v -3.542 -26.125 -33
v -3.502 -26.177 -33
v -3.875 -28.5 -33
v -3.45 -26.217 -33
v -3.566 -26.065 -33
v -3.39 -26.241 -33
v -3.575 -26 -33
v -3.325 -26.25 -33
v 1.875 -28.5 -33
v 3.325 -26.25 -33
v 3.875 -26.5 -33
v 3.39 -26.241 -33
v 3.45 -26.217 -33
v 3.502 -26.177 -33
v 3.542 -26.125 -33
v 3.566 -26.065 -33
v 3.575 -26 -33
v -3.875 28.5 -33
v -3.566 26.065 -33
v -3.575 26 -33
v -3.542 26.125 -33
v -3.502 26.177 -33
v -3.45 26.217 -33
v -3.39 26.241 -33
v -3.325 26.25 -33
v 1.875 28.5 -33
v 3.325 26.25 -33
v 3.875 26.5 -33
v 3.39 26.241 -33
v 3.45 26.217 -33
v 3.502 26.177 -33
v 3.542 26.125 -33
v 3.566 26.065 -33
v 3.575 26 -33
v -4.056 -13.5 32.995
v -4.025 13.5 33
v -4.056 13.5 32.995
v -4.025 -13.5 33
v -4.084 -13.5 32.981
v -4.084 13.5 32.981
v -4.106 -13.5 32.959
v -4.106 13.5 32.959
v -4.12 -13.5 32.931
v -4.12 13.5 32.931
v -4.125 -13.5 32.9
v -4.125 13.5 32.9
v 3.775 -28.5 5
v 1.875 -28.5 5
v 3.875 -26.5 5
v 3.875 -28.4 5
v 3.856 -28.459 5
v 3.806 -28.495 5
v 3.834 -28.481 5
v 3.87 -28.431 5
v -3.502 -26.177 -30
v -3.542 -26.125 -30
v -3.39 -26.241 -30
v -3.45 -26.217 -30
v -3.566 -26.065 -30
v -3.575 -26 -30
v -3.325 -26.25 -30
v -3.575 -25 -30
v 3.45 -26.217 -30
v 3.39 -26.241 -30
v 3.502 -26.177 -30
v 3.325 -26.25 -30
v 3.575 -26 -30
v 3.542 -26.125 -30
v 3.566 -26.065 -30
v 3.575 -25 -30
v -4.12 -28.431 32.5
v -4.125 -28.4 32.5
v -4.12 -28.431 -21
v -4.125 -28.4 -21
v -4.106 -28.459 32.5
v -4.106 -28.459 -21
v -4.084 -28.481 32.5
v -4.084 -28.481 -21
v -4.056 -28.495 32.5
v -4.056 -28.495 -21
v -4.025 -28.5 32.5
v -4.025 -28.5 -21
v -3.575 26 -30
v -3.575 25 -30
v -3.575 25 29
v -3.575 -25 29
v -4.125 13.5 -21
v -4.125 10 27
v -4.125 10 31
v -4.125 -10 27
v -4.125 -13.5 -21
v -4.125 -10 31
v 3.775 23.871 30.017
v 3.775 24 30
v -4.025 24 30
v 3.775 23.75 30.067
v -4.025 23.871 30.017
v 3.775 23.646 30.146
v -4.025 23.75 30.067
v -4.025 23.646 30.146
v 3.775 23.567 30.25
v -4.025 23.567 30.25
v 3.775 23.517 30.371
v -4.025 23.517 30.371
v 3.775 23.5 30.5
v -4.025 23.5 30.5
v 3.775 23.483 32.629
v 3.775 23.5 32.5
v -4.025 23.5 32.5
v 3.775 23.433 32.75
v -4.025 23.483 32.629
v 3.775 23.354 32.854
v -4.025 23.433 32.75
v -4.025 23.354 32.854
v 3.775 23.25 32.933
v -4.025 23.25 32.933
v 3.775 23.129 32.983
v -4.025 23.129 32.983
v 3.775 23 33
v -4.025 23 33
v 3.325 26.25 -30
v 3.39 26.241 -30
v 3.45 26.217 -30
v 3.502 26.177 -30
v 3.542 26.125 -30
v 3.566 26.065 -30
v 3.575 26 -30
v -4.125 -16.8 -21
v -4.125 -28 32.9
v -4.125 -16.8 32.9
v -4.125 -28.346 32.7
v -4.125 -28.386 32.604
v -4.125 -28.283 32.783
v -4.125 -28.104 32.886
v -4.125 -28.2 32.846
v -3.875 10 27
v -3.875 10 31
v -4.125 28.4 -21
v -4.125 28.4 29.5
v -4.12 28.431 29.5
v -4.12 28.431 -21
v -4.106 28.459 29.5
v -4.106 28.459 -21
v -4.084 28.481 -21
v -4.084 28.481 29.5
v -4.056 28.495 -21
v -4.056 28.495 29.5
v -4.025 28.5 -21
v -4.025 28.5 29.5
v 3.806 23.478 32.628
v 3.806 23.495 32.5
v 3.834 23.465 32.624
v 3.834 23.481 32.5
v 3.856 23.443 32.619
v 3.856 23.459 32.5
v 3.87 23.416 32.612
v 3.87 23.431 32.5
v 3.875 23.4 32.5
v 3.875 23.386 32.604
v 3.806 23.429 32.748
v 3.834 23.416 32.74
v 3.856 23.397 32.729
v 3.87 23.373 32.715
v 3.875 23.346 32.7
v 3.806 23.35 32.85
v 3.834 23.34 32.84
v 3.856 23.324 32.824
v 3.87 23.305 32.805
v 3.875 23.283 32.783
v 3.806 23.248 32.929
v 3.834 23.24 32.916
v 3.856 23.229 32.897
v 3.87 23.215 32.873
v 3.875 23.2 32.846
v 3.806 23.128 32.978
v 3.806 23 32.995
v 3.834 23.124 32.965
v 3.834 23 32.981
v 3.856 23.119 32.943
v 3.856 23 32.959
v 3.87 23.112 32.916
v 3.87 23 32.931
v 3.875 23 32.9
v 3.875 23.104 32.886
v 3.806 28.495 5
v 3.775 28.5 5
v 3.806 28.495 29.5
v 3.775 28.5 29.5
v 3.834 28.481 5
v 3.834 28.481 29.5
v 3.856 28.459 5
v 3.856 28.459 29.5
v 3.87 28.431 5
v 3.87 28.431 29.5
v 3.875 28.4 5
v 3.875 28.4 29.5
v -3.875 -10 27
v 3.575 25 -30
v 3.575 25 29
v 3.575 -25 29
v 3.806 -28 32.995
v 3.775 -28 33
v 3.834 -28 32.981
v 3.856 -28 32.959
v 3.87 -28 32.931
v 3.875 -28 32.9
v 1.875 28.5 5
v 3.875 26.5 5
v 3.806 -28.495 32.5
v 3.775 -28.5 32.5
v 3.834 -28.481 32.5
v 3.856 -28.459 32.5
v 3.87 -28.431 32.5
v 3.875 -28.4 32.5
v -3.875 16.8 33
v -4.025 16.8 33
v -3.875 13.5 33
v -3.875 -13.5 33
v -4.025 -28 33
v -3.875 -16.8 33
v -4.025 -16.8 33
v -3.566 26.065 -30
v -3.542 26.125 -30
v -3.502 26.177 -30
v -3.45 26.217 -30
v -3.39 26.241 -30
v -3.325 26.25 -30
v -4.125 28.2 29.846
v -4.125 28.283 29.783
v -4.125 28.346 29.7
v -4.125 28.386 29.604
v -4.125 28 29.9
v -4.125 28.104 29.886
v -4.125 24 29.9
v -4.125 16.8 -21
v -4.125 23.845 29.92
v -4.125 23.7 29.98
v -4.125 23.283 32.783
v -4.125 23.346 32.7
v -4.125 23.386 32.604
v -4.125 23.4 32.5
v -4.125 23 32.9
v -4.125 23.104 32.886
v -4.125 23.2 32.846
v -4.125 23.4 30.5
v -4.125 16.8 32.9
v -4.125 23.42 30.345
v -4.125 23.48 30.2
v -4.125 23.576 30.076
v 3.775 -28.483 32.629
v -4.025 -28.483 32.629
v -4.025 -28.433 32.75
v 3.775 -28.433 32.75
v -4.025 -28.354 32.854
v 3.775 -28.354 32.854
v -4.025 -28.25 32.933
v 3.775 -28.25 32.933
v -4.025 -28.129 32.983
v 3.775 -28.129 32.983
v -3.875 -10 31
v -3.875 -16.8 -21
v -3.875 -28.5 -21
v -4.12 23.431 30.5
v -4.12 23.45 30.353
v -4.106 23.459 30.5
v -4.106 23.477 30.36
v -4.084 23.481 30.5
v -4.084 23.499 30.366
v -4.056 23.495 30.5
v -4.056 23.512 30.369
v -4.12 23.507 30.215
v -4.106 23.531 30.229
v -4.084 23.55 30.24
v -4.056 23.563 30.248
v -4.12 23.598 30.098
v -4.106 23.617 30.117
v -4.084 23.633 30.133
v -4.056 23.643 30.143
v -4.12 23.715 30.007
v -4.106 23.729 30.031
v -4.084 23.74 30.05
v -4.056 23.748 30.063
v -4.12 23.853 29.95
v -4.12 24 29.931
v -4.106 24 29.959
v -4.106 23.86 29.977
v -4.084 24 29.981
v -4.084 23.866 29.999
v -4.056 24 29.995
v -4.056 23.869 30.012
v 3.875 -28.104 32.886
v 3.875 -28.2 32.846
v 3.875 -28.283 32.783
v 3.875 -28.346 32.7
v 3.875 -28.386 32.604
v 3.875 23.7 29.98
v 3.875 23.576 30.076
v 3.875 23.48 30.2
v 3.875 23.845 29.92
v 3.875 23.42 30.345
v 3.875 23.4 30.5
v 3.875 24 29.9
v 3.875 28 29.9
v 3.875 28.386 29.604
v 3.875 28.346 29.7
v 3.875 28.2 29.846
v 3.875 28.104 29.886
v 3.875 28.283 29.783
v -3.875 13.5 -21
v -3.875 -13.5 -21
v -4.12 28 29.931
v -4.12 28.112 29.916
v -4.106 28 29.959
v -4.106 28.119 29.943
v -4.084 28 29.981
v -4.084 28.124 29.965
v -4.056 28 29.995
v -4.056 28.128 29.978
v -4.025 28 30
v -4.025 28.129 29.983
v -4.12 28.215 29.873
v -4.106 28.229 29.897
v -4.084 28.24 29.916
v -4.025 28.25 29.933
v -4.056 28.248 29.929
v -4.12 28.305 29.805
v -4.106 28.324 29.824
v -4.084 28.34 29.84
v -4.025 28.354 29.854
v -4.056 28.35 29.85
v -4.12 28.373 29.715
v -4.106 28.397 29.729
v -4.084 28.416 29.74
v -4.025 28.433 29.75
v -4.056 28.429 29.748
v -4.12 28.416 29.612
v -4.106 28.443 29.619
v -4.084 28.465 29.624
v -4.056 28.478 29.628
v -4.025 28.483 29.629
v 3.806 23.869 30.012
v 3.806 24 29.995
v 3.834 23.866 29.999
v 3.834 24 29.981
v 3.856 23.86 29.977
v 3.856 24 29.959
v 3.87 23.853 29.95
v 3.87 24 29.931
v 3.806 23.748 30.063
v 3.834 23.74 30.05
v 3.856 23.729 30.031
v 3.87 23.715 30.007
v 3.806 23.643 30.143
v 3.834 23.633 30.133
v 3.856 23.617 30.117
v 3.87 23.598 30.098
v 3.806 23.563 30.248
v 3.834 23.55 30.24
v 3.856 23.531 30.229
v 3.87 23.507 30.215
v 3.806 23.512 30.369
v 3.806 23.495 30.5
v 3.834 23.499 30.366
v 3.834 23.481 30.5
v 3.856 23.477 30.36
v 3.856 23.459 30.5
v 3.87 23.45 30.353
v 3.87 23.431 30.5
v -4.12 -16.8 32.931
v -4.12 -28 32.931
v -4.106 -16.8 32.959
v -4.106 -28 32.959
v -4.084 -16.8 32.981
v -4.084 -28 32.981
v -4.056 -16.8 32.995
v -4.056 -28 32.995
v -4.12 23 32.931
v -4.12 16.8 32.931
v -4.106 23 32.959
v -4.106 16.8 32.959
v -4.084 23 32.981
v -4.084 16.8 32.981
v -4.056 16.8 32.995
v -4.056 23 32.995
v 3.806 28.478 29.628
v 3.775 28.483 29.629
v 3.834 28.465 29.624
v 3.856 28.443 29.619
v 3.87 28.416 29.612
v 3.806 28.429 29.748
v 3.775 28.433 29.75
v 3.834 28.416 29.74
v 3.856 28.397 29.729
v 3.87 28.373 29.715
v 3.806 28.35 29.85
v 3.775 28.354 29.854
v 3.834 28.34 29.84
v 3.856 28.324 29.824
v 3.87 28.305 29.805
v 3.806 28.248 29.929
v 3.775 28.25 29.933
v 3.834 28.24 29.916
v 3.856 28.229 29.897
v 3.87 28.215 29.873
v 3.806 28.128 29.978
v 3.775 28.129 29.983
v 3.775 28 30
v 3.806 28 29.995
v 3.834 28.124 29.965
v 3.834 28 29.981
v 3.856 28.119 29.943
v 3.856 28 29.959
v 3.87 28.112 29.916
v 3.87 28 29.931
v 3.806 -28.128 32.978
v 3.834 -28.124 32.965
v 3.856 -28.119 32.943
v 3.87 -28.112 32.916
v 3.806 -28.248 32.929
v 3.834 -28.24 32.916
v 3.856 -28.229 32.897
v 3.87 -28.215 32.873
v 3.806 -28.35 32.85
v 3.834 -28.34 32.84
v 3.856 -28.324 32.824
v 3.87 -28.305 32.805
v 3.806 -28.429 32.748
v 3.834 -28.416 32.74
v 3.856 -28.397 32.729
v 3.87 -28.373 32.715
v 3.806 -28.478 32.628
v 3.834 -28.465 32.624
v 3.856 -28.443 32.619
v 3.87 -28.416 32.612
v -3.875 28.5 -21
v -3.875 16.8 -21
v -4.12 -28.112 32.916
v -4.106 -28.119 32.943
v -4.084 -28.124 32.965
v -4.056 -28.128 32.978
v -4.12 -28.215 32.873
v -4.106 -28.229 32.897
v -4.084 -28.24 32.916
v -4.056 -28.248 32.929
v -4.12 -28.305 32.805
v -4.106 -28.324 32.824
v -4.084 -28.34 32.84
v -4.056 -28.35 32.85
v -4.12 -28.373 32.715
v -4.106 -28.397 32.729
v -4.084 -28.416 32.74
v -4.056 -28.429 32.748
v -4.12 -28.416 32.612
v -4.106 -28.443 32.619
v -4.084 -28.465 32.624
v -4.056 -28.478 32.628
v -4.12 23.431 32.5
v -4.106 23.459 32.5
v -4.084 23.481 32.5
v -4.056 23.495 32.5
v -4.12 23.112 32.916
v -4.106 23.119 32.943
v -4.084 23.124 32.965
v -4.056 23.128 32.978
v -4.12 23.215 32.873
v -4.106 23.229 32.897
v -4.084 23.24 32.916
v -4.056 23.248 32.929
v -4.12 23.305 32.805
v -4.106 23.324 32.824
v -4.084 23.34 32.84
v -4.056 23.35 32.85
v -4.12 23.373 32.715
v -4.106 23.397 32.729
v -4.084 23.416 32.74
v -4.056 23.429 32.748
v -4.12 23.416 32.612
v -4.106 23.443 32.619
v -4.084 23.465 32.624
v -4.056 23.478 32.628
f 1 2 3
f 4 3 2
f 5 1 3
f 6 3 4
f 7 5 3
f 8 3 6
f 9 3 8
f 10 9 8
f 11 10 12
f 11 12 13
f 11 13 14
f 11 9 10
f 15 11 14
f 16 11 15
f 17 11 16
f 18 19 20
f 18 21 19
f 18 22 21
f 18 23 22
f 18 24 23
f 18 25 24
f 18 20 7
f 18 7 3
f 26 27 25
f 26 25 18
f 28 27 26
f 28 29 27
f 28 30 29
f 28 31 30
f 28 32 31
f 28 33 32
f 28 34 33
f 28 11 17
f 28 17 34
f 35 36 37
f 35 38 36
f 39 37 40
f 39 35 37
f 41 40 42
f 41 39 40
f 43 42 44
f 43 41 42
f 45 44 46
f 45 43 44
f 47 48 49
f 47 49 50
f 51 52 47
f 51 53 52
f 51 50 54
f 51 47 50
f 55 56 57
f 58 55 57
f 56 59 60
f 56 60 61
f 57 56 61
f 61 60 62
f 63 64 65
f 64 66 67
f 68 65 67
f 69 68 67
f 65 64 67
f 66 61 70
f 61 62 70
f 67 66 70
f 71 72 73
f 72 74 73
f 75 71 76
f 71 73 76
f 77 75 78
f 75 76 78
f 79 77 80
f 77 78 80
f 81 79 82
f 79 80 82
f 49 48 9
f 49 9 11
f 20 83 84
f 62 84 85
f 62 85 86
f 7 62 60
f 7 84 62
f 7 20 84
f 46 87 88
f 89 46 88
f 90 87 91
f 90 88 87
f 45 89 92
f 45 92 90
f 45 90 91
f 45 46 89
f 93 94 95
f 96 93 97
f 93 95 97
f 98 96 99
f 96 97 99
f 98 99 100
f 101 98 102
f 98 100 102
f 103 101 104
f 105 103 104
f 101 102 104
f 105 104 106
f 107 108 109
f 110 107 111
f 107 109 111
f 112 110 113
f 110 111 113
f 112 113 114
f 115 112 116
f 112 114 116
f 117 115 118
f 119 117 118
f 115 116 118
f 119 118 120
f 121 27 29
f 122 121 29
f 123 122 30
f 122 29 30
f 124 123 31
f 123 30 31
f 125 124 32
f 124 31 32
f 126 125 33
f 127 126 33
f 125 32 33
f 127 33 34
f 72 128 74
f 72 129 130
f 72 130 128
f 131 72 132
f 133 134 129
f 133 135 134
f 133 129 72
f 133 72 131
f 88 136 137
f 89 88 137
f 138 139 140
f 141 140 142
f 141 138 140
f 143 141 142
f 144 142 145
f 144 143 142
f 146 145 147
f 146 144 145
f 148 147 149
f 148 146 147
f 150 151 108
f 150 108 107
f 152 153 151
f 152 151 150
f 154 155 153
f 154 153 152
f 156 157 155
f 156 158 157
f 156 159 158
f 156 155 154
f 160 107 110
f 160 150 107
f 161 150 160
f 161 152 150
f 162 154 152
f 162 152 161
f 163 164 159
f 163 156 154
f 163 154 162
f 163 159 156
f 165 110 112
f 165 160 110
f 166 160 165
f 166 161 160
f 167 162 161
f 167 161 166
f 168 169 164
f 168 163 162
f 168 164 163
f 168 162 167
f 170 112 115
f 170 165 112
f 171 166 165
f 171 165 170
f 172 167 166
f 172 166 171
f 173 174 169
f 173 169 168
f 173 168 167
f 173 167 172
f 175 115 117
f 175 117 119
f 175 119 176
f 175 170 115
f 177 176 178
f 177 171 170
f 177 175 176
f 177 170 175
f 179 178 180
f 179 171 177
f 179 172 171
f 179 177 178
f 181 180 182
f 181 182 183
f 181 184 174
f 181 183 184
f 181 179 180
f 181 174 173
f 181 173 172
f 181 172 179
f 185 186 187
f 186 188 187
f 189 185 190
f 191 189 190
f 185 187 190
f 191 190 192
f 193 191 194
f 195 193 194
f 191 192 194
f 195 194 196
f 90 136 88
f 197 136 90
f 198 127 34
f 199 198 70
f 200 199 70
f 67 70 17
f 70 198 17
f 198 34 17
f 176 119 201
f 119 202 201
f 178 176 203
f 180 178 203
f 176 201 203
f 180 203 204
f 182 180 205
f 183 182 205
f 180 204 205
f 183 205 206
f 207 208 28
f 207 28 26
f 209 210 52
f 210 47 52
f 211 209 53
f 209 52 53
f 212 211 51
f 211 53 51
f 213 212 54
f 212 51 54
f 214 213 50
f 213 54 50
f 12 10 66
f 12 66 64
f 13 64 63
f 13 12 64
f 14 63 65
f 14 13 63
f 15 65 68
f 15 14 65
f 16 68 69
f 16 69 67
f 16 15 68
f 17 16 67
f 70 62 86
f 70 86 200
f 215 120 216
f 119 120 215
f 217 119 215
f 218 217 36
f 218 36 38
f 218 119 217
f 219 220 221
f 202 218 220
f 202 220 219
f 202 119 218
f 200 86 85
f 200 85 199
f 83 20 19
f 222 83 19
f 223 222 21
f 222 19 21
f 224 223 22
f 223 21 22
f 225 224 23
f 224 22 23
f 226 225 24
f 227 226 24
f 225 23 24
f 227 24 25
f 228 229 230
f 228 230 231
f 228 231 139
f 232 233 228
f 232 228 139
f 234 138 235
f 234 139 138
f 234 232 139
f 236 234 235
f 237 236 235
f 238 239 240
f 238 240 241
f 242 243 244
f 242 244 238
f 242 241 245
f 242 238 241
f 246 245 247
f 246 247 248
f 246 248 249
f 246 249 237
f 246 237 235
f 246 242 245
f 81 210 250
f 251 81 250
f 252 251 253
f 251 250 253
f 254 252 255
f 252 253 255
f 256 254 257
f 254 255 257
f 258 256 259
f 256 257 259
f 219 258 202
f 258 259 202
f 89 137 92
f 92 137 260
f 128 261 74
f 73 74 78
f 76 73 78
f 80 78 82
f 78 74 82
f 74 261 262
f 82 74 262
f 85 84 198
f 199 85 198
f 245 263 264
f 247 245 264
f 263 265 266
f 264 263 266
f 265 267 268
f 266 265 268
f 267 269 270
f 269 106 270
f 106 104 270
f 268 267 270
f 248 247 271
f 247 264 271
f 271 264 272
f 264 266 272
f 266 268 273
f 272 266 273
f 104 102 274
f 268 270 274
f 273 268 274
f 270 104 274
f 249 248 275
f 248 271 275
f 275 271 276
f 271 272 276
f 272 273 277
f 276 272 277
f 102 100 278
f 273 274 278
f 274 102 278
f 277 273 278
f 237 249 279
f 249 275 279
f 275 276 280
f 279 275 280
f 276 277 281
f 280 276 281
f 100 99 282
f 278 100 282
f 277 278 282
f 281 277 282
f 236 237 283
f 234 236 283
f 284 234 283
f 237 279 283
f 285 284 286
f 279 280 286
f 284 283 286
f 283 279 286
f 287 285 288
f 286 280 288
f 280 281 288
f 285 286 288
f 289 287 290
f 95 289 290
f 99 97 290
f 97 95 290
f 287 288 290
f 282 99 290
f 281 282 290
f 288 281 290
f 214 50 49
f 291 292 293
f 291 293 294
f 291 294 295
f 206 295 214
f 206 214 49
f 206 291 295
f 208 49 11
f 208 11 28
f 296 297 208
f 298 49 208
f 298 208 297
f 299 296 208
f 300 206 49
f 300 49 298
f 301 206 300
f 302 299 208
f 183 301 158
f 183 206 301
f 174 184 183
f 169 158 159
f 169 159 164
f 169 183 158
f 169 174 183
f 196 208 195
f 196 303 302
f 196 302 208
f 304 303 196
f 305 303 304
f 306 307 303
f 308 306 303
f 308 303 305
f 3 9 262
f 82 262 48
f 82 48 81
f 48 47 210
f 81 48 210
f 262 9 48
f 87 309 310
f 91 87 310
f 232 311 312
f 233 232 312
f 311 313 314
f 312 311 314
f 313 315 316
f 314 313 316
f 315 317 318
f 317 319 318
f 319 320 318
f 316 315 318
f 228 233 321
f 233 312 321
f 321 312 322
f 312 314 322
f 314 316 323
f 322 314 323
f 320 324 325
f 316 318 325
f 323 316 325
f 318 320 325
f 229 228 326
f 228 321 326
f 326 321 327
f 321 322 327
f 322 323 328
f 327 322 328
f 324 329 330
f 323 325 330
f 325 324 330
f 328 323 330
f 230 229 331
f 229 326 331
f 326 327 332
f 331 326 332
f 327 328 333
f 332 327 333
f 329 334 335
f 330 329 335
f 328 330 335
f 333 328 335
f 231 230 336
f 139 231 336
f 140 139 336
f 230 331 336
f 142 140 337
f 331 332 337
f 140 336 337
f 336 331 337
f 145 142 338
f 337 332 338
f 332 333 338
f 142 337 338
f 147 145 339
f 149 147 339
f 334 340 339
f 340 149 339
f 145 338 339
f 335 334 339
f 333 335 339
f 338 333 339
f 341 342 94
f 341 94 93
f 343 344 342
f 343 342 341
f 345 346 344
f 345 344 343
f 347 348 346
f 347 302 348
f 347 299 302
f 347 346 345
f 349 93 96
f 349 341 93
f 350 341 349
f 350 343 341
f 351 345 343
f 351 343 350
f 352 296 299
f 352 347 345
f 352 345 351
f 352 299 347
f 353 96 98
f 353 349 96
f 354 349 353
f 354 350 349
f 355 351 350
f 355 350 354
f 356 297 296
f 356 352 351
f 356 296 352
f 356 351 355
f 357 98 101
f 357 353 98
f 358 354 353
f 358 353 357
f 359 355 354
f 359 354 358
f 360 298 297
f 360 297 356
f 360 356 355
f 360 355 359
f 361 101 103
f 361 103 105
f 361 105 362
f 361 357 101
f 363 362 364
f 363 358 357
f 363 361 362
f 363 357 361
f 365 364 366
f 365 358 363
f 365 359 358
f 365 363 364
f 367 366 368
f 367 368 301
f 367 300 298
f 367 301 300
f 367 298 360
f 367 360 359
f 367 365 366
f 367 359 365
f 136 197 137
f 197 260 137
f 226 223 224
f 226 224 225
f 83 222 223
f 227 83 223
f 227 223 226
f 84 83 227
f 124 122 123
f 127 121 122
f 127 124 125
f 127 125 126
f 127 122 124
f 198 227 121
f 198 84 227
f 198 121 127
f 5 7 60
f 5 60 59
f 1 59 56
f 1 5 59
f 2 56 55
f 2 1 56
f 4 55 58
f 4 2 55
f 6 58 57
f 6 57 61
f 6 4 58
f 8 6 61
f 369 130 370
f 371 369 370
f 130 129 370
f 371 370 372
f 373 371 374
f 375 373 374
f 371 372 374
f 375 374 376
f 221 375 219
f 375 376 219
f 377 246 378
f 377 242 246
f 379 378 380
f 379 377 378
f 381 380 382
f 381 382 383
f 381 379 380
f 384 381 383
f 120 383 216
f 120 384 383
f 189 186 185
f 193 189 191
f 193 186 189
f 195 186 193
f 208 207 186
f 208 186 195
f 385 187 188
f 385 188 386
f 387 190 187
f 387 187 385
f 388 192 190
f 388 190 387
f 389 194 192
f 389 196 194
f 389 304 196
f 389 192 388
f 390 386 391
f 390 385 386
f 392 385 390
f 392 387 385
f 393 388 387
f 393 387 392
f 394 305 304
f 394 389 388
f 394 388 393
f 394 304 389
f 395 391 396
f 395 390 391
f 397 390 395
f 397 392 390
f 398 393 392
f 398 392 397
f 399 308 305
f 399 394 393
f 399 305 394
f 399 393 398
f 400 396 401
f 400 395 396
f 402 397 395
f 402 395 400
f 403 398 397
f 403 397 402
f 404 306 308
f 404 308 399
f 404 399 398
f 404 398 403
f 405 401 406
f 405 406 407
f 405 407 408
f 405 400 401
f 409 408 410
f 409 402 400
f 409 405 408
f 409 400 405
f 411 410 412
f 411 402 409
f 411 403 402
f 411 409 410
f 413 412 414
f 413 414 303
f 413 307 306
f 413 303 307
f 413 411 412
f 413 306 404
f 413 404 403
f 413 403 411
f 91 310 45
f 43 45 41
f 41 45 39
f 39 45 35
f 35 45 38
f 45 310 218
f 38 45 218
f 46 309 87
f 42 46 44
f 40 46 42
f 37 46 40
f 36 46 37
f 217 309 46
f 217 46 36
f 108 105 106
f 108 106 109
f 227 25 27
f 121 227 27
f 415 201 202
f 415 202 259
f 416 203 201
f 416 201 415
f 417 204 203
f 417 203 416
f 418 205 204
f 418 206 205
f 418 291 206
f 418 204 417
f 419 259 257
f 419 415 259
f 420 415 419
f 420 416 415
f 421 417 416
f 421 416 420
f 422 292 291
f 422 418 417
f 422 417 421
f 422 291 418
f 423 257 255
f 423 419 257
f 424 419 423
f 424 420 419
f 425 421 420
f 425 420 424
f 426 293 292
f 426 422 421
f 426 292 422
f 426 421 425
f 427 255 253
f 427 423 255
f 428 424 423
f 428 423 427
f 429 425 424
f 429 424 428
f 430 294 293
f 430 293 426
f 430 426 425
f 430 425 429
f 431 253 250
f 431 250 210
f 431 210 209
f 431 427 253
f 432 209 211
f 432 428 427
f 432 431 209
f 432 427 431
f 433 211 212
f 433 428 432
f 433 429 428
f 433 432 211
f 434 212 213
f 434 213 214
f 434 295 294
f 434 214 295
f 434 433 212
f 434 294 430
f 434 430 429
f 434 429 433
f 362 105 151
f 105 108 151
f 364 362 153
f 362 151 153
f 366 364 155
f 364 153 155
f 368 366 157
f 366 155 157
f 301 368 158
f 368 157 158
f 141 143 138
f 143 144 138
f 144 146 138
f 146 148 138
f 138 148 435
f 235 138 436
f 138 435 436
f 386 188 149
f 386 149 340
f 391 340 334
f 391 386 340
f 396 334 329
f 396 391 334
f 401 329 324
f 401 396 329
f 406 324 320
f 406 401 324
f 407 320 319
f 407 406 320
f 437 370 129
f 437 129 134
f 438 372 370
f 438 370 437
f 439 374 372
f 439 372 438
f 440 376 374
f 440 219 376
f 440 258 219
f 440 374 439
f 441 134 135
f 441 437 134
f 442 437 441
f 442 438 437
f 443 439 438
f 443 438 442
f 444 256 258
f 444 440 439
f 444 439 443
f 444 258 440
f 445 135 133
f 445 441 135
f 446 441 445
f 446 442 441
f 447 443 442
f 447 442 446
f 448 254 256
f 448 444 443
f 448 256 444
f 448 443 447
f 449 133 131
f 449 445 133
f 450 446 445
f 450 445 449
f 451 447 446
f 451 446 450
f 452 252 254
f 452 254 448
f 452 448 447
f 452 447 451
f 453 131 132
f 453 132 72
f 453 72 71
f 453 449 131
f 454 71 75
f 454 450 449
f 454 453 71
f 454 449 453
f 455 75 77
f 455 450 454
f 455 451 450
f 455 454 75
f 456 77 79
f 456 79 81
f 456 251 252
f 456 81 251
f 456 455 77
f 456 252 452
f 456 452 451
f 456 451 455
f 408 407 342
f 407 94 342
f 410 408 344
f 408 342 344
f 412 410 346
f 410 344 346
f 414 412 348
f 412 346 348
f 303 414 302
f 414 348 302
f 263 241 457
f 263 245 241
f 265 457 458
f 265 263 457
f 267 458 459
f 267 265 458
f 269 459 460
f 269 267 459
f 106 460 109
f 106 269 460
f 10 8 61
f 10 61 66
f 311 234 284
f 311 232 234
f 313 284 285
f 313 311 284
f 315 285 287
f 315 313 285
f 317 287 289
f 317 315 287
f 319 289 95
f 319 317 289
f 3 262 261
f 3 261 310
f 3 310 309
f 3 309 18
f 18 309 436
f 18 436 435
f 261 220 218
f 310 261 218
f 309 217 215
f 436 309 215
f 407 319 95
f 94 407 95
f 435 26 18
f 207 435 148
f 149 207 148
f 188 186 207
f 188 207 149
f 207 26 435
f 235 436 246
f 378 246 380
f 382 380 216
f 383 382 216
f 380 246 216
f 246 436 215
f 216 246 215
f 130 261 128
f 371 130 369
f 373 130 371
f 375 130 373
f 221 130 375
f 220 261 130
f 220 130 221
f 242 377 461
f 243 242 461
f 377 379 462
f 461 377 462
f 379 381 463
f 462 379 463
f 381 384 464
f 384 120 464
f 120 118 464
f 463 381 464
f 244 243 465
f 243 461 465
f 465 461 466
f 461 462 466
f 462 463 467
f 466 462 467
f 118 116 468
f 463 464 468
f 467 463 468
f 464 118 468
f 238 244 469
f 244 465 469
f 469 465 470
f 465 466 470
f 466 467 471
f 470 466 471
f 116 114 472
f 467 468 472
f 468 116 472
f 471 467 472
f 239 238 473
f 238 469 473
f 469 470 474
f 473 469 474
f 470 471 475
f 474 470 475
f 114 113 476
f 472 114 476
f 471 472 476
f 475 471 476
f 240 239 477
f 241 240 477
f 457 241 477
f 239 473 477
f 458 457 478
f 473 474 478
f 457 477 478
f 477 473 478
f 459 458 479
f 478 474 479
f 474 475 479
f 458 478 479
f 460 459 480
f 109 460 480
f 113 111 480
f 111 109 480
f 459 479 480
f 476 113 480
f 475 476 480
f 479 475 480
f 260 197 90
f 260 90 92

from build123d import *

# Parameters (mm, degrees)
F1_DEPTH  = 3.875
F3_DEPTH  = 38
F4_W      = 27
F4_H      = 54
F4_W_2    = 20
F4_H_2    = 4
F4_W_3    = 11.7
F5_DEPTH  = 0.25
F8_R      = 0.5
F9_R      = 0.1
F11_W     = 7.15
F11_H     = 50
F12_DEPTH = 62
F14_DEPTH = 3


# Not quite as in the source:
# - a pattern or mirror of a feature is missing from the dataset's text; its kind, count and spacing are read off the source's solid


with BuildPart() as f1:
    # F0 (on Right) → F1 (new body, symmetric)
    with BuildSketch(Plane.YZ):
        Polygon((23.5, 33), (-28.5, 33), (-28.5, -33), (28.5, -33), (28.5, 30), (23.5, 30), align=None)
    extrude(amount=F1_DEPTH, both=True)

    # F2 (on face) → F3 (cut)
    with BuildSketch(Plane(origin=(0, 0, -33), x_dir=(1, 0, 0), z_dir=(0, 0, -1))):
        Polygon((3.875, 28.5), (1.875, 28.5), (3.875, 26.5), align=None)
        Polygon((3.875, -26.5), (1.875, -28.5), (3.875, -28.5), align=None)
    extrude(amount=-F3_DEPTH, mode=Mode.SUBTRACT)

    # F4 (on face) → F5 (join)
    with BuildSketch(Plane(origin=(-3.875, 0, 0), x_dir=(0, -1, 0), z_dir=(-1, 0, 0))):
        with Locations((0, 6)):
            Rectangle(F4_W, F4_H)
        with Locations((0, 29)):
            Rectangle(F4_W_2, F4_H_2, mode=Mode.SUBTRACT)
        with Locations((22.65, 6)):
            Rectangle(F4_W_3, F4_H)
        Polygon((-28.5, 30), (-28.5, -21), (-16.8, -21), (-16.8, 33), (-23.5, 33), (-23.5, 30), align=None)
    extrude(amount=F5_DEPTH)

    # F8
    f8_edges = [f1.edges().sort_by_distance(p)[0] for p in [
        (-0.125, 23.5, 33),
        (-0.125, 23.5, 30),
        (-0.125, 28.5, 30),
        (-0.125, -28.5, 33),
    ]]
    fillet(f8_edges, radius=F8_R)

    # F9
    f9_edges = [f1.edges().sort_by_distance(p)[0] for p in [
        (3.875, -2.5, 33),
        (3.875, 26, 30),
        (-4.125, 26, 30),
        (-4.125, 23.5, 31.5),
        (3.875, 23.5, 31.5),
        (-4.125, 19.9, 33),
        (-4.125, 0, 33),
        (-4.125, -22.4, 33),
        (-4.125, -28.5, 5.75),
        (3.875, -28.5, 18.75),
        (-4.125, 28.5, 4.25),
        (-4.125, -28.353553, 32.853553),
        (3.875, -28.353553, 32.853553),
        (3.875, 23.646447, 30.146447),
        (3.875, 23.353553, 32.853553),
        (3.875, 28.353553, 29.853553),
        (3.875, 28.5, 17.25),
        (-4.125, 23.353553, 32.853553),
        (-4.125, 28.353553, 29.853553),
        (-4.125, 23.646447, 30.146447),
    ]]
    fillet(f9_edges, radius=F9_R)

    # F11 (on face) → F12 (cut)
    with BuildSketch(Plane(origin=(0, 0, -33), x_dir=(1, 0, 0), z_dir=(0, 0, -1))):
        Rectangle(F11_W, F11_H)
    extrude(amount=-F12_DEPTH, mode=Mode.SUBTRACT)

    # F13 (on face) → F14 (cut)
    with BuildSketch(Plane(origin=(0, 0, -33), x_dir=(1, 0, 0), z_dir=(0, 0, -1))):
        with BuildLine():
            Line((3.575, -25), (-3.575, -25))
            Line((-3.575, -25), (-3.575, -26))
            ThreePointArc((-3.575, -26), (-3.5017766953, -26.1767766953), (-3.325, -26.25))
            Line((-3.325, -26.25), (3.325, -26.25))
            ThreePointArc((3.325, -26.25), (3.5017766953, -26.1767766953), (3.575, -26))
            Line((3.575, -26), (3.575, -25))
        make_face()
    f14 = extrude(amount=-F14_DEPTH, mode=Mode.SUBTRACT)

    # F14_copies: F14 across plane
    add(f14.mirror(Plane(origin=(0, 0, 0), x_dir=(0, 0, -1), z_dir=(0, -1, 0))), mode=Mode.SUBTRACT)


solid = f1.part
